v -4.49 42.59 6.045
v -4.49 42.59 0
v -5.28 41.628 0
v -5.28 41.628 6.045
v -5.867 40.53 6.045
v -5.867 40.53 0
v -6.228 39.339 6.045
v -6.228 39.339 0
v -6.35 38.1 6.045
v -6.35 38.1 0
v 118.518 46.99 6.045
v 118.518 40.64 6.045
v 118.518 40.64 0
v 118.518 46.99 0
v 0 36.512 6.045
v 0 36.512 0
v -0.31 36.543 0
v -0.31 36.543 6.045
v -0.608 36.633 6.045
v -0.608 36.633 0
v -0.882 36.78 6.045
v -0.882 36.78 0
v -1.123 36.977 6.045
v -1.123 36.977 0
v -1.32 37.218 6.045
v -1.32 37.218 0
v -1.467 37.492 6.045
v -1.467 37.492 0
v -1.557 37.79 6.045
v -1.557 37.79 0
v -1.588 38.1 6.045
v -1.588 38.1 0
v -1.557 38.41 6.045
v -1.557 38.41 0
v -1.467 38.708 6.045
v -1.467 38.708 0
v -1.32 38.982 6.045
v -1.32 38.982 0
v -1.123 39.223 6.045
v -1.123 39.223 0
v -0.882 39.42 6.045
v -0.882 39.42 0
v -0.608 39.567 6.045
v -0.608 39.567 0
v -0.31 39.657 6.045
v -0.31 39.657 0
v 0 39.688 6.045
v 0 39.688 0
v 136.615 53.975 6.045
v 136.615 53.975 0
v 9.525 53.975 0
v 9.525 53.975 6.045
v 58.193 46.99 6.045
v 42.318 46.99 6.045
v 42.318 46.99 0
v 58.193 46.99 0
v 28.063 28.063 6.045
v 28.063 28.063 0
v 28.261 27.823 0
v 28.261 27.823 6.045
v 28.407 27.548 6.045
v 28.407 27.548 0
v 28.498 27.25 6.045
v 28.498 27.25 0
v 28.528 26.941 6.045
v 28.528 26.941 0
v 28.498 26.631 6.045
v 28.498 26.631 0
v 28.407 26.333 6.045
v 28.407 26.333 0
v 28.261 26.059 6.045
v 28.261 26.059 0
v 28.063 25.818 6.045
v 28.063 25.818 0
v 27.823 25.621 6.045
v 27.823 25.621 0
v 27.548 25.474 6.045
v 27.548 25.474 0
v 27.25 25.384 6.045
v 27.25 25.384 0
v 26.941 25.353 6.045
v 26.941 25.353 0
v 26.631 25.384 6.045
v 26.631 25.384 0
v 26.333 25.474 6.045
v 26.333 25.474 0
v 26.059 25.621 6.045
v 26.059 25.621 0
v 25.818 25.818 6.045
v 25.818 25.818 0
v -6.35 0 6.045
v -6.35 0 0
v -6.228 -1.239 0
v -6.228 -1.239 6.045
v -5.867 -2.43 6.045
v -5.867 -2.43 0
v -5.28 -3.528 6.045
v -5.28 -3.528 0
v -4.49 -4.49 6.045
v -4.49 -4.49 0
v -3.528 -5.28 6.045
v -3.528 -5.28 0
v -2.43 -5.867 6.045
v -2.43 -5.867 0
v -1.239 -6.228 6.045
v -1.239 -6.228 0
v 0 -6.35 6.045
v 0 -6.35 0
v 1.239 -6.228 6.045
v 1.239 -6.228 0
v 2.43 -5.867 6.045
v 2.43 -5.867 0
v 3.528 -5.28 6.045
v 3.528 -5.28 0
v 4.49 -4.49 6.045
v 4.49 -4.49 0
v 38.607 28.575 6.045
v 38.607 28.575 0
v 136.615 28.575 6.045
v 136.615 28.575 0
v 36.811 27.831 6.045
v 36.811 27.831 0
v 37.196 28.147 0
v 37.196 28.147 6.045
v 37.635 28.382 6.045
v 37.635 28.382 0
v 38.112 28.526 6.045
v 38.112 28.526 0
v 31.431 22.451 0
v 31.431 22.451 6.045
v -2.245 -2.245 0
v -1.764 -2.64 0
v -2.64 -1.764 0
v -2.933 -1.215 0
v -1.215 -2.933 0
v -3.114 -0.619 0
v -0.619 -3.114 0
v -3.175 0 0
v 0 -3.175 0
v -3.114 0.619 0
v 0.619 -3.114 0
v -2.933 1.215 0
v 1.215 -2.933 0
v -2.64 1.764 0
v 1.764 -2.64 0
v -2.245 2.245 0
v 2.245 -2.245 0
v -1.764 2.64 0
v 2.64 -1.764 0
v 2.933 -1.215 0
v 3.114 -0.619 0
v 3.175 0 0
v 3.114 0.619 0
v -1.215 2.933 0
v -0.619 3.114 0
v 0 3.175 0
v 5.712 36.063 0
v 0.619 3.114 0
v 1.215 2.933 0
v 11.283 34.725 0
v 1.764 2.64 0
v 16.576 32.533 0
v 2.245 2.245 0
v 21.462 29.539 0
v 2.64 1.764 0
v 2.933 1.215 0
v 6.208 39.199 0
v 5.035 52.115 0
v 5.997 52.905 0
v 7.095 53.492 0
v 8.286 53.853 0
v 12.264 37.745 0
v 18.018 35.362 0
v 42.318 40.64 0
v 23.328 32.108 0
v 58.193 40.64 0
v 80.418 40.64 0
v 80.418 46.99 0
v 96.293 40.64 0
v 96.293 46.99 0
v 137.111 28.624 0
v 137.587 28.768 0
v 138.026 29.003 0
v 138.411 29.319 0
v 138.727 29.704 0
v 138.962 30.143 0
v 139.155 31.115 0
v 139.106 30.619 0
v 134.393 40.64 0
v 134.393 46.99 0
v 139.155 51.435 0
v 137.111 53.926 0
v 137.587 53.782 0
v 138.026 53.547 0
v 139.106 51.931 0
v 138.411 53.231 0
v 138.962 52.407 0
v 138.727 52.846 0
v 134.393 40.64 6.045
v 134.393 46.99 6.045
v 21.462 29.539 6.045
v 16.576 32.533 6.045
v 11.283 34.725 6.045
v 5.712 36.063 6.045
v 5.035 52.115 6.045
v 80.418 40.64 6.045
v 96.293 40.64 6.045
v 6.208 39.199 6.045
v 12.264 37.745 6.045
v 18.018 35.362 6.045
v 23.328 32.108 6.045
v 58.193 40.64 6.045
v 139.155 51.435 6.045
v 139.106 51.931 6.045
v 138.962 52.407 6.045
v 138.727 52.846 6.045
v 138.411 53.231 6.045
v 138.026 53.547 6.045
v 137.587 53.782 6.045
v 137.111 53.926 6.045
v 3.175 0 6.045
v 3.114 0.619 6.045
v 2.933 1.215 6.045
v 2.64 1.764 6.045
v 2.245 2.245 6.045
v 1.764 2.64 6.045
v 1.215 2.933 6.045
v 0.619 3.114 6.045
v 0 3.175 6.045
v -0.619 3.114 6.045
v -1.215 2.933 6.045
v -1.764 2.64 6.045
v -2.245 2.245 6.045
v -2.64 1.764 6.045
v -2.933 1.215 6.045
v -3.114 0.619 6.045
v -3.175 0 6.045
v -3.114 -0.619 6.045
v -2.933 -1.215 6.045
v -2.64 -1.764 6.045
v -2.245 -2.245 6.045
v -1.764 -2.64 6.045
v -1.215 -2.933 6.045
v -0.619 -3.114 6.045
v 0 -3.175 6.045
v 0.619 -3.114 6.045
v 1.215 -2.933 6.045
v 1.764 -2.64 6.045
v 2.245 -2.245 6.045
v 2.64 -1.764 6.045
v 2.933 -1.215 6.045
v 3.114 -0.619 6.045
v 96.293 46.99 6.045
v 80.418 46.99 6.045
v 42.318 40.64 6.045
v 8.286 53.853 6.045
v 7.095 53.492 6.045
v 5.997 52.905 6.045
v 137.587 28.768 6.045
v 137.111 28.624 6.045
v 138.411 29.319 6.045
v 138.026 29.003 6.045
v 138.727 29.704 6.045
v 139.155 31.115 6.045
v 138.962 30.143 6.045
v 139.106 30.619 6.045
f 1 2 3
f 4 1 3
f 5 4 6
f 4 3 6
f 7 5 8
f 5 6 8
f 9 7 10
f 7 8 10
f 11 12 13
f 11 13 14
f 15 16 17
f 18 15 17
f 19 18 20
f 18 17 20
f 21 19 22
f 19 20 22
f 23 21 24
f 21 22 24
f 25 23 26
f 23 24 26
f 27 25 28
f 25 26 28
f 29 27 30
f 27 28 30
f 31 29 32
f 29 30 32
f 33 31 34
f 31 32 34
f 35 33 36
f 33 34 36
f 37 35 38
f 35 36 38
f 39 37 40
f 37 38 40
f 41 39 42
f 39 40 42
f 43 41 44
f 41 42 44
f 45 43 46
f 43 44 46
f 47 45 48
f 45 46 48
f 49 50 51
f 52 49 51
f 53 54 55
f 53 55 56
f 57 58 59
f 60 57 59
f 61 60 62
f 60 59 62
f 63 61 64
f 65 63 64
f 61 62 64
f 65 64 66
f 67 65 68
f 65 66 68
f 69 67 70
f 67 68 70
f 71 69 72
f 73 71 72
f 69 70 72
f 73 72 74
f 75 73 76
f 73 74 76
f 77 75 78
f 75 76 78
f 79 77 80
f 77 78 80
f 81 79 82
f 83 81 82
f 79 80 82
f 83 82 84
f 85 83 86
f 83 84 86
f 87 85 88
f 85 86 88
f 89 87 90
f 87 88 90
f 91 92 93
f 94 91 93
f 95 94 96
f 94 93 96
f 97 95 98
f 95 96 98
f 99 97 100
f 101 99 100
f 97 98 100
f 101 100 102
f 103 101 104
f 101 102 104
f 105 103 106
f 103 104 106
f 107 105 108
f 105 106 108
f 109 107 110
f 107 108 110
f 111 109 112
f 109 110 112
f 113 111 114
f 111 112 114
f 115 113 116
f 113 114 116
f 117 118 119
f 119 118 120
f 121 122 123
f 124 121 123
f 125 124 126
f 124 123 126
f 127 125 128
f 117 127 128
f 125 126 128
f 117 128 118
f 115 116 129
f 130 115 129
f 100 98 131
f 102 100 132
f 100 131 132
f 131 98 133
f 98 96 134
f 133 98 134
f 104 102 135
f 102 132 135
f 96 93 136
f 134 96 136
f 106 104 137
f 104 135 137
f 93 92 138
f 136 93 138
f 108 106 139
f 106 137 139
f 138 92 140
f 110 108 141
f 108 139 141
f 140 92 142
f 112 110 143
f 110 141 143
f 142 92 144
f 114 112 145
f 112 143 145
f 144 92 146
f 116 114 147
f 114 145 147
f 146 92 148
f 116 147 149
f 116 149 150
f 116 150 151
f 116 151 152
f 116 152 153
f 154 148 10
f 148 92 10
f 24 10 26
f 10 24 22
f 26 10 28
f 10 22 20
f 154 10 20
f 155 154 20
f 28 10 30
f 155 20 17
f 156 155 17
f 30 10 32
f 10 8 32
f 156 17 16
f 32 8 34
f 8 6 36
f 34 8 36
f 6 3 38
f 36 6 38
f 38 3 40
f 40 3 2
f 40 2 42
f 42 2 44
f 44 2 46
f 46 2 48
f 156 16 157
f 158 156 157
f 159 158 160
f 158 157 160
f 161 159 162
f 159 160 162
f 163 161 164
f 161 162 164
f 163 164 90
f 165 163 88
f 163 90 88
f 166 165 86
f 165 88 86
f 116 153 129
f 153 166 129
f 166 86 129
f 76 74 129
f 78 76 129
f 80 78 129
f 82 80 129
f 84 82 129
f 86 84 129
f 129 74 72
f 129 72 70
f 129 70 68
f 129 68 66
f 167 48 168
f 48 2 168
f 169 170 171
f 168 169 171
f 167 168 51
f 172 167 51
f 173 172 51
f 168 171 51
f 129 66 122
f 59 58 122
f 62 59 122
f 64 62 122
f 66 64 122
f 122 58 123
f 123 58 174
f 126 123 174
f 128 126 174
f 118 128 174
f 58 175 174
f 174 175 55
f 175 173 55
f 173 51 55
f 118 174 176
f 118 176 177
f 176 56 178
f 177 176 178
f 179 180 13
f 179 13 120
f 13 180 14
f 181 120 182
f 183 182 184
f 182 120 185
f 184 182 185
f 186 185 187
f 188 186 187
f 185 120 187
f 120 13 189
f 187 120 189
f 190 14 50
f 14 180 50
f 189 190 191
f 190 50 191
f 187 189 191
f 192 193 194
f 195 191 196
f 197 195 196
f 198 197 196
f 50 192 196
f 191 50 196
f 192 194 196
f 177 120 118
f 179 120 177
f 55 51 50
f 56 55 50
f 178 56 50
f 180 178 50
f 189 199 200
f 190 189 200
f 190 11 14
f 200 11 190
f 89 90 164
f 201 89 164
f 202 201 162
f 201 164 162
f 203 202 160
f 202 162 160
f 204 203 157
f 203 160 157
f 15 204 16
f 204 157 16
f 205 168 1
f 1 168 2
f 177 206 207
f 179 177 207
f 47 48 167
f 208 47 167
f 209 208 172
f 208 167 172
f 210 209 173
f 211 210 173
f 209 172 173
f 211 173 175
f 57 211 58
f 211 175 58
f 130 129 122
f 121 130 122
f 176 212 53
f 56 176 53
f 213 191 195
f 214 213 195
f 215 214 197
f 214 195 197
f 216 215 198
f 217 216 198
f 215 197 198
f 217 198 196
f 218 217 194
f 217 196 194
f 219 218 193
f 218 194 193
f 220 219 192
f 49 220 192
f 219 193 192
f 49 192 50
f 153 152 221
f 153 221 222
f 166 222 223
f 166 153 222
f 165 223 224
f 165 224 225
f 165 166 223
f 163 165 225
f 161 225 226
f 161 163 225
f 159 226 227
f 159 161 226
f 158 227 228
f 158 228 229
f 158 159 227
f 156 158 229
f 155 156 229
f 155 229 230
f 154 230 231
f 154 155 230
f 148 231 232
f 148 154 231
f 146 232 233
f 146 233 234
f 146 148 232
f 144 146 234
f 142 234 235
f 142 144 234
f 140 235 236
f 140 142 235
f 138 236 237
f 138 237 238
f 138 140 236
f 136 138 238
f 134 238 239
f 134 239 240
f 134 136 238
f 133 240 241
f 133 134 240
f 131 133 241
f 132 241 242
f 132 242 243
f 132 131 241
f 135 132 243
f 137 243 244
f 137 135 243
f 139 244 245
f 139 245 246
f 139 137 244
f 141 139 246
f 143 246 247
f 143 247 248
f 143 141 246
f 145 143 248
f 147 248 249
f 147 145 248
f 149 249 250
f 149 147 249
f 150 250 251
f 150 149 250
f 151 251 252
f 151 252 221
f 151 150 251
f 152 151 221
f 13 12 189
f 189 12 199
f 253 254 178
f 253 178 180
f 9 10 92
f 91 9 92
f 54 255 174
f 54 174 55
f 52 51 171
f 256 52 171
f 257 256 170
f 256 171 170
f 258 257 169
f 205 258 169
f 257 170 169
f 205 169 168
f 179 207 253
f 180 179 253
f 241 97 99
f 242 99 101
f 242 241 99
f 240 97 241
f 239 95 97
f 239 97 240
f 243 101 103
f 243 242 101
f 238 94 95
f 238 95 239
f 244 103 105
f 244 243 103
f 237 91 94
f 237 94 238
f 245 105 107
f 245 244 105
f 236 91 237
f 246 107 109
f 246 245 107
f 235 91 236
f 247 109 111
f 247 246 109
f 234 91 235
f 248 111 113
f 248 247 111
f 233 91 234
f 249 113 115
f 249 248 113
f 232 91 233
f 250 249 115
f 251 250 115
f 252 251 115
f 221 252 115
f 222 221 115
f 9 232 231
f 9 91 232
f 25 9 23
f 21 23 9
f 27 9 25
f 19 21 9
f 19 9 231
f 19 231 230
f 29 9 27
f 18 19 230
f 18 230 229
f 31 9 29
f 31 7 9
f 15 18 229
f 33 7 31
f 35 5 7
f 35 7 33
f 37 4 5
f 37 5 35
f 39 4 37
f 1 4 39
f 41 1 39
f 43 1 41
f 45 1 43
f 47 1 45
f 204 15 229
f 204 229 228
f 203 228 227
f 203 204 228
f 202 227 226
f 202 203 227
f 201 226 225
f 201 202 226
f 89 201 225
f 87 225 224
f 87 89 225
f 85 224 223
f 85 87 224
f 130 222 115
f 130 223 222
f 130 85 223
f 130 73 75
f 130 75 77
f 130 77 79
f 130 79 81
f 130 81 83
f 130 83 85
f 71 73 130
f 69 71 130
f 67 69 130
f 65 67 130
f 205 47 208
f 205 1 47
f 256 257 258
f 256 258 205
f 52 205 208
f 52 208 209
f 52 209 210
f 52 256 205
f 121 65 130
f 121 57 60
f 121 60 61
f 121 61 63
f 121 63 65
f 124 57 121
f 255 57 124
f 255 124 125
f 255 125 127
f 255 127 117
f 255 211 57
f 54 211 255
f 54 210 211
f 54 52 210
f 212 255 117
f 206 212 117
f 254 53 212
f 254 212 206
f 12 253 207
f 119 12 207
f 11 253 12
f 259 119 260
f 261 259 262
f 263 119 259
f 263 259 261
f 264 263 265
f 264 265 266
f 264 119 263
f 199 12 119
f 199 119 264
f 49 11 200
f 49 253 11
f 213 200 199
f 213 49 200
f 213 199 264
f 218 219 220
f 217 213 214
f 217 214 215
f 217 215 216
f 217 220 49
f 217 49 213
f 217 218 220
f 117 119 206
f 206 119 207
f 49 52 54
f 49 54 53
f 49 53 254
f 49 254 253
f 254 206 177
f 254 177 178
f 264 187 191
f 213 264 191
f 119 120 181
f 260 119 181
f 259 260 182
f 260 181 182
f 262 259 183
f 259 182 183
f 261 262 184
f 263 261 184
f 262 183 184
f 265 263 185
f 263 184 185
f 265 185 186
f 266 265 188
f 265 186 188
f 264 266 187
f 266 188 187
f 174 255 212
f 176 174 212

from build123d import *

# Parameters (mm, degrees)
SKETCH1_R           = 3.175
BOSS_EXTRUDE1_DEPTH = 6.0452
SKETCH2_W           = 15.875
SKETCH2_H           = 6.35
CUT_EXTRUDE1_DEPTH  = 6.0452


with BuildPart() as part:
    # Sketch1 → Boss-Extrude1 (new body)
    with BuildSketch(Plane.XY):
        with BuildLine():
            Line((-6.35, 38.1), (-6.35, 0))
            ThreePointArc((-6.35, 0), (-2.430039796, -5.866635031), (4.490128061, -4.490128061))
            Line((4.490128061, -4.490128061), (31.430896424, 22.450640303))
            Line((31.430896424, 22.450640303), (36.811307345, 27.831051224))
            ThreePointArc((36.811307345, 27.831051224), (37.635342651, 28.381654013), (38.607358569, 28.575))
            Line((38.607358569, 28.575), (136.615256121, 28.575))
            ThreePointArc((136.615256121, 28.575), (138.411307345, 29.318948776), (139.155256121, 31.115))
            Line((139.155256121, 31.115), (139.155256121, 51.435))
            ThreePointArc((139.155256121, 51.435), (138.411307345, 53.231051224), (136.615256121, 53.975))
            Line((136.615256121, 53.975), (9.525, 53.975))
            ThreePointArc((9.525, 53.975), (7.094960204, 53.491635031), (5.034871939, 52.115128061))
            Line((5.034871939, 52.115128061), (-4.490128061, 42.590128061))
            ThreePointArc((-4.490128061, 42.590128061), (-5.866635031, 40.530039796), (-6.35, 38.1))
        make_face()
        Circle(SKETCH1_R, mode=Mode.SUBTRACT)
        with BuildLine():
            ThreePointArc((25.818236348, 25.818236348), (13.972728824, 33.733151431), (0, 36.5125))
            ThreePointArc((0, 36.5125), (-1.5875, 38.1), (0, 39.6875))
            ThreePointArc((0, 39.6875), (15.187748722, 36.666468947), (28.063300378, 28.063300378))
            ThreePointArc((28.063300378, 28.063300378), (28.063300378, 25.818236348), (25.818236348, 25.818236348))
        make_face(mode=Mode.SUBTRACT)
    extrude(amount=BOSS_EXTRUDE1_DEPTH)

    # Sketch2 → Cut-Extrude1 (cut)
    with BuildSketch(Plane.XY.offset(6.0452)):
        with Locations((126.455256121, 43.815)):
            Rectangle(SKETCH2_W, SKETCH2_H)
        with Locations((88.355256121, 43.815)):
            Rectangle(SKETCH2_W, SKETCH2_H)
        with Locations((50.255256121, 43.815)):
            Rectangle(SKETCH2_W, SKETCH2_H)
    extrude(amount=-CUT_EXTRUDE1_DEPTH, mode=Mode.SUBTRACT)


solid = part.part
